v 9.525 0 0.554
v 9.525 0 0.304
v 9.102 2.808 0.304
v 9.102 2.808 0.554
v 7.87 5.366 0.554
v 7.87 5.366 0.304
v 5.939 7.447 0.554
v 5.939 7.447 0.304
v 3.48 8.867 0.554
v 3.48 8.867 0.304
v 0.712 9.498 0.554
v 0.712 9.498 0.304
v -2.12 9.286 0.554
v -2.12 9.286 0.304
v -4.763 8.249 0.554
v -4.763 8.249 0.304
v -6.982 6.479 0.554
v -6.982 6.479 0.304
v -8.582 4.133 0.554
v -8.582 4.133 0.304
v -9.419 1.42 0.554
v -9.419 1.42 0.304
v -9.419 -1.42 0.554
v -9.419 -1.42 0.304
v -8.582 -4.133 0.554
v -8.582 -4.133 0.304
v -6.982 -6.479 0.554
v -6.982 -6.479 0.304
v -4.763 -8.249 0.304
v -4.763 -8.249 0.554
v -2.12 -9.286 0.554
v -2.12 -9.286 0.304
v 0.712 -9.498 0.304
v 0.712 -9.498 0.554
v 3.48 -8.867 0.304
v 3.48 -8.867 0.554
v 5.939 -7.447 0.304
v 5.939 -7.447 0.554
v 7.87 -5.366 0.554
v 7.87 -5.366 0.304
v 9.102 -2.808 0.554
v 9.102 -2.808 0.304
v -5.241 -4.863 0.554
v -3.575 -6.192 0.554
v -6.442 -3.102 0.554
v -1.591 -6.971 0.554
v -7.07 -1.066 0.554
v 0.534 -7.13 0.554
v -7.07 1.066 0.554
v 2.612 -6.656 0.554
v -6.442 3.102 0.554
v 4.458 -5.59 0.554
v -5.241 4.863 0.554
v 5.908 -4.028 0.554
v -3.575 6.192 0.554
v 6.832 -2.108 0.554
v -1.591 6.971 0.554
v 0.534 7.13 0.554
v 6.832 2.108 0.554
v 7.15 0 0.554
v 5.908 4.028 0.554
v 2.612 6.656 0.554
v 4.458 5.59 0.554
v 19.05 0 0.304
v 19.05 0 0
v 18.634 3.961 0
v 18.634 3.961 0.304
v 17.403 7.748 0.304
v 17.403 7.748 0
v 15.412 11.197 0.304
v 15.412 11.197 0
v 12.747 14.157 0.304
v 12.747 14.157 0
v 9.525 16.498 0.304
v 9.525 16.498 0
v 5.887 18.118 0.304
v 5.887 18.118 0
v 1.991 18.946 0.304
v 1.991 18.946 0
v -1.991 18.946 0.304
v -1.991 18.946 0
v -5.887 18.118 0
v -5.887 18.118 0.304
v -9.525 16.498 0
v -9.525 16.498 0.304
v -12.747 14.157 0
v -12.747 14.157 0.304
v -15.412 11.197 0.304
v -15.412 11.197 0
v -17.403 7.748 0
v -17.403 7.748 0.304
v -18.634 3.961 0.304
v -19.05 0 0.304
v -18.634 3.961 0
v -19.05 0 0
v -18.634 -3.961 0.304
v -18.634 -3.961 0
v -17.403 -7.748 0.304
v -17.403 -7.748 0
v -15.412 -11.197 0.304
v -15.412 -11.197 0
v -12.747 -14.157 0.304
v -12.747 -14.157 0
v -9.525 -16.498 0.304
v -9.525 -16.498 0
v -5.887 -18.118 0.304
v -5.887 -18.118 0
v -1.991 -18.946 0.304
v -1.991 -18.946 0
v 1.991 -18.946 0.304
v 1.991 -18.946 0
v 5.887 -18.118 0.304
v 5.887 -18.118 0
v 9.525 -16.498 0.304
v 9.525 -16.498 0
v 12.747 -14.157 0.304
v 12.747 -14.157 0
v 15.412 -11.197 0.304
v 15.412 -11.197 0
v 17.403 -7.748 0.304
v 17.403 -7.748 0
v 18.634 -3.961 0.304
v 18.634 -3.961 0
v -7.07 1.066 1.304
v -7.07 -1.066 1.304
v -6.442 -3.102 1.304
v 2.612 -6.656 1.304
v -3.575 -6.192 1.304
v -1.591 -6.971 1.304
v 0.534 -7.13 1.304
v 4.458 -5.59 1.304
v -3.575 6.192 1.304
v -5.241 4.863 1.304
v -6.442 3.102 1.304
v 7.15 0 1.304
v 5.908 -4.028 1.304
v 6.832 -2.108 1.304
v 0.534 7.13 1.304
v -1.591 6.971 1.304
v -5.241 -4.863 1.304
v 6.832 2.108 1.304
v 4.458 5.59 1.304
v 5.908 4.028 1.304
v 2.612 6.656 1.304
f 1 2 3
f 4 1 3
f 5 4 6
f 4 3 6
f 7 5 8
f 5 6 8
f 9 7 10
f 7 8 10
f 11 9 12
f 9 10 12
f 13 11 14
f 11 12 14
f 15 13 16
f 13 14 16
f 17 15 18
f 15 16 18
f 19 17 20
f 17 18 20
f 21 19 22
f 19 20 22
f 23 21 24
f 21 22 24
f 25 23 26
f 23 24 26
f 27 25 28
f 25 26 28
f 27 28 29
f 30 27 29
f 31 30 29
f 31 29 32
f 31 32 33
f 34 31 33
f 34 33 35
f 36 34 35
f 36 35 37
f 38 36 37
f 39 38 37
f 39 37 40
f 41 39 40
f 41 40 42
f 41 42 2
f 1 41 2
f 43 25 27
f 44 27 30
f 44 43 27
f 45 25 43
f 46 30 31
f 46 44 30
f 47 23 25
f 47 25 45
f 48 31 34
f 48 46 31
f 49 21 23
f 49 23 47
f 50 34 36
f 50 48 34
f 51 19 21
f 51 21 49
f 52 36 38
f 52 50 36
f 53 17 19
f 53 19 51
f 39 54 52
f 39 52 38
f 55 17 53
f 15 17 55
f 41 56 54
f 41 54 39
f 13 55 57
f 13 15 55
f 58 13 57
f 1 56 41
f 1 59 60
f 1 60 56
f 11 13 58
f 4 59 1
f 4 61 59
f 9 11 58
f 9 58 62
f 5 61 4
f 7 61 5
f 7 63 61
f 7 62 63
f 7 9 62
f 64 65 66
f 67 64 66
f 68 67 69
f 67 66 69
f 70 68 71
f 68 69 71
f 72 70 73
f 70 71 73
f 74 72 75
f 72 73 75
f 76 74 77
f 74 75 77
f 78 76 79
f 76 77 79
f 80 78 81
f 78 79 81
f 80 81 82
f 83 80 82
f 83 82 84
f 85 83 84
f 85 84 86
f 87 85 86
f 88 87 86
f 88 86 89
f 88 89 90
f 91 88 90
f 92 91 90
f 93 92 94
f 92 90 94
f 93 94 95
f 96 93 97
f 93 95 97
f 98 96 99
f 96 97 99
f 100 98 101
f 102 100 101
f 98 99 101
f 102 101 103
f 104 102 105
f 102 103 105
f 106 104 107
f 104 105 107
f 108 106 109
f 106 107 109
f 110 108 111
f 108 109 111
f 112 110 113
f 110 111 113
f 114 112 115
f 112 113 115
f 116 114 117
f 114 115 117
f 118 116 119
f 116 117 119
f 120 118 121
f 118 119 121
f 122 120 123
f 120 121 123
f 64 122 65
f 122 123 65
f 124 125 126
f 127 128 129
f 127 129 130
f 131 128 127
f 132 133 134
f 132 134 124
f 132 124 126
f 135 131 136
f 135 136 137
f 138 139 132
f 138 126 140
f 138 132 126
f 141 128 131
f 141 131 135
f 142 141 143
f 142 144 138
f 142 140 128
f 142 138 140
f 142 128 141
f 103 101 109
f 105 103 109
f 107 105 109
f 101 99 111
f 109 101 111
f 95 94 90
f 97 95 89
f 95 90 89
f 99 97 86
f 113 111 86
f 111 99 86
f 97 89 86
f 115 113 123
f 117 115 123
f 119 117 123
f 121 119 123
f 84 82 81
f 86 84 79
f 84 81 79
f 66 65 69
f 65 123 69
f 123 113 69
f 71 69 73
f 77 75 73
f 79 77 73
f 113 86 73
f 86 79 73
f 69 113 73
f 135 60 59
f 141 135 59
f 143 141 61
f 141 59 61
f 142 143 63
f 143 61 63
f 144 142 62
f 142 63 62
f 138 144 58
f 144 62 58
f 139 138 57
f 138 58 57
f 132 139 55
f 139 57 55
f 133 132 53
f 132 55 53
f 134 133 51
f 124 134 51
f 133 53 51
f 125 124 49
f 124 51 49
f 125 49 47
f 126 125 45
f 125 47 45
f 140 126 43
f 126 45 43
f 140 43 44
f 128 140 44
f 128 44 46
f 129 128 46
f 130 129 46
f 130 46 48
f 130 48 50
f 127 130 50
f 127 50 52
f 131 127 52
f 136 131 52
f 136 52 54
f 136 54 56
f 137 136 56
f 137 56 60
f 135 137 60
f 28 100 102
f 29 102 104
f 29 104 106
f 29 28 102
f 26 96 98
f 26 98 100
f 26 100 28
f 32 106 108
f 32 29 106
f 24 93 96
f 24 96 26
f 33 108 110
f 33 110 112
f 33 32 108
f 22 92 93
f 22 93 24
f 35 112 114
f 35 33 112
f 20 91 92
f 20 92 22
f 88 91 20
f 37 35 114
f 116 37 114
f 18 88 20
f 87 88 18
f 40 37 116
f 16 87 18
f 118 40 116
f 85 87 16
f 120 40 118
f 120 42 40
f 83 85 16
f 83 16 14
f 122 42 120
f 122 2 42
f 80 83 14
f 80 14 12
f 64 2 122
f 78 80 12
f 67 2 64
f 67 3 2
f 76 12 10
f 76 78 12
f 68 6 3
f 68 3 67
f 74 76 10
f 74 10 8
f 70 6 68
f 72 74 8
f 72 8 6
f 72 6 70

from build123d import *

# Parameters (mm, degrees)
F0_R     = 19.05
F0_R_2   = 9.525
F1_DEPTH = 0.303999
F0_R_3   = 7.1501
F2_DEPTH = 0.553999
F3_DEPTH = 1.303999


with BuildPart() as f1:
    # F0 (on Top) → F1 (new body)
    with BuildSketch(Plane.XY):
        Circle(F0_R)
        Circle(F0_R_2, mode=Mode.SUBTRACT)
    extrude(amount=F1_DEPTH)

    # F0 (on Top) → F2 (join)
    with BuildSketch(Plane.XY):
        Circle(F0_R_2)
        Circle(F0_R_3, mode=Mode.SUBTRACT)
    extrude(amount=F2_DEPTH)

    # F0 (on Top) → F3 (join)
    with BuildSketch(Plane.XY):
        Circle(F0_R_3)
    extrude(amount=F3_DEPTH)


solid = f1.part
